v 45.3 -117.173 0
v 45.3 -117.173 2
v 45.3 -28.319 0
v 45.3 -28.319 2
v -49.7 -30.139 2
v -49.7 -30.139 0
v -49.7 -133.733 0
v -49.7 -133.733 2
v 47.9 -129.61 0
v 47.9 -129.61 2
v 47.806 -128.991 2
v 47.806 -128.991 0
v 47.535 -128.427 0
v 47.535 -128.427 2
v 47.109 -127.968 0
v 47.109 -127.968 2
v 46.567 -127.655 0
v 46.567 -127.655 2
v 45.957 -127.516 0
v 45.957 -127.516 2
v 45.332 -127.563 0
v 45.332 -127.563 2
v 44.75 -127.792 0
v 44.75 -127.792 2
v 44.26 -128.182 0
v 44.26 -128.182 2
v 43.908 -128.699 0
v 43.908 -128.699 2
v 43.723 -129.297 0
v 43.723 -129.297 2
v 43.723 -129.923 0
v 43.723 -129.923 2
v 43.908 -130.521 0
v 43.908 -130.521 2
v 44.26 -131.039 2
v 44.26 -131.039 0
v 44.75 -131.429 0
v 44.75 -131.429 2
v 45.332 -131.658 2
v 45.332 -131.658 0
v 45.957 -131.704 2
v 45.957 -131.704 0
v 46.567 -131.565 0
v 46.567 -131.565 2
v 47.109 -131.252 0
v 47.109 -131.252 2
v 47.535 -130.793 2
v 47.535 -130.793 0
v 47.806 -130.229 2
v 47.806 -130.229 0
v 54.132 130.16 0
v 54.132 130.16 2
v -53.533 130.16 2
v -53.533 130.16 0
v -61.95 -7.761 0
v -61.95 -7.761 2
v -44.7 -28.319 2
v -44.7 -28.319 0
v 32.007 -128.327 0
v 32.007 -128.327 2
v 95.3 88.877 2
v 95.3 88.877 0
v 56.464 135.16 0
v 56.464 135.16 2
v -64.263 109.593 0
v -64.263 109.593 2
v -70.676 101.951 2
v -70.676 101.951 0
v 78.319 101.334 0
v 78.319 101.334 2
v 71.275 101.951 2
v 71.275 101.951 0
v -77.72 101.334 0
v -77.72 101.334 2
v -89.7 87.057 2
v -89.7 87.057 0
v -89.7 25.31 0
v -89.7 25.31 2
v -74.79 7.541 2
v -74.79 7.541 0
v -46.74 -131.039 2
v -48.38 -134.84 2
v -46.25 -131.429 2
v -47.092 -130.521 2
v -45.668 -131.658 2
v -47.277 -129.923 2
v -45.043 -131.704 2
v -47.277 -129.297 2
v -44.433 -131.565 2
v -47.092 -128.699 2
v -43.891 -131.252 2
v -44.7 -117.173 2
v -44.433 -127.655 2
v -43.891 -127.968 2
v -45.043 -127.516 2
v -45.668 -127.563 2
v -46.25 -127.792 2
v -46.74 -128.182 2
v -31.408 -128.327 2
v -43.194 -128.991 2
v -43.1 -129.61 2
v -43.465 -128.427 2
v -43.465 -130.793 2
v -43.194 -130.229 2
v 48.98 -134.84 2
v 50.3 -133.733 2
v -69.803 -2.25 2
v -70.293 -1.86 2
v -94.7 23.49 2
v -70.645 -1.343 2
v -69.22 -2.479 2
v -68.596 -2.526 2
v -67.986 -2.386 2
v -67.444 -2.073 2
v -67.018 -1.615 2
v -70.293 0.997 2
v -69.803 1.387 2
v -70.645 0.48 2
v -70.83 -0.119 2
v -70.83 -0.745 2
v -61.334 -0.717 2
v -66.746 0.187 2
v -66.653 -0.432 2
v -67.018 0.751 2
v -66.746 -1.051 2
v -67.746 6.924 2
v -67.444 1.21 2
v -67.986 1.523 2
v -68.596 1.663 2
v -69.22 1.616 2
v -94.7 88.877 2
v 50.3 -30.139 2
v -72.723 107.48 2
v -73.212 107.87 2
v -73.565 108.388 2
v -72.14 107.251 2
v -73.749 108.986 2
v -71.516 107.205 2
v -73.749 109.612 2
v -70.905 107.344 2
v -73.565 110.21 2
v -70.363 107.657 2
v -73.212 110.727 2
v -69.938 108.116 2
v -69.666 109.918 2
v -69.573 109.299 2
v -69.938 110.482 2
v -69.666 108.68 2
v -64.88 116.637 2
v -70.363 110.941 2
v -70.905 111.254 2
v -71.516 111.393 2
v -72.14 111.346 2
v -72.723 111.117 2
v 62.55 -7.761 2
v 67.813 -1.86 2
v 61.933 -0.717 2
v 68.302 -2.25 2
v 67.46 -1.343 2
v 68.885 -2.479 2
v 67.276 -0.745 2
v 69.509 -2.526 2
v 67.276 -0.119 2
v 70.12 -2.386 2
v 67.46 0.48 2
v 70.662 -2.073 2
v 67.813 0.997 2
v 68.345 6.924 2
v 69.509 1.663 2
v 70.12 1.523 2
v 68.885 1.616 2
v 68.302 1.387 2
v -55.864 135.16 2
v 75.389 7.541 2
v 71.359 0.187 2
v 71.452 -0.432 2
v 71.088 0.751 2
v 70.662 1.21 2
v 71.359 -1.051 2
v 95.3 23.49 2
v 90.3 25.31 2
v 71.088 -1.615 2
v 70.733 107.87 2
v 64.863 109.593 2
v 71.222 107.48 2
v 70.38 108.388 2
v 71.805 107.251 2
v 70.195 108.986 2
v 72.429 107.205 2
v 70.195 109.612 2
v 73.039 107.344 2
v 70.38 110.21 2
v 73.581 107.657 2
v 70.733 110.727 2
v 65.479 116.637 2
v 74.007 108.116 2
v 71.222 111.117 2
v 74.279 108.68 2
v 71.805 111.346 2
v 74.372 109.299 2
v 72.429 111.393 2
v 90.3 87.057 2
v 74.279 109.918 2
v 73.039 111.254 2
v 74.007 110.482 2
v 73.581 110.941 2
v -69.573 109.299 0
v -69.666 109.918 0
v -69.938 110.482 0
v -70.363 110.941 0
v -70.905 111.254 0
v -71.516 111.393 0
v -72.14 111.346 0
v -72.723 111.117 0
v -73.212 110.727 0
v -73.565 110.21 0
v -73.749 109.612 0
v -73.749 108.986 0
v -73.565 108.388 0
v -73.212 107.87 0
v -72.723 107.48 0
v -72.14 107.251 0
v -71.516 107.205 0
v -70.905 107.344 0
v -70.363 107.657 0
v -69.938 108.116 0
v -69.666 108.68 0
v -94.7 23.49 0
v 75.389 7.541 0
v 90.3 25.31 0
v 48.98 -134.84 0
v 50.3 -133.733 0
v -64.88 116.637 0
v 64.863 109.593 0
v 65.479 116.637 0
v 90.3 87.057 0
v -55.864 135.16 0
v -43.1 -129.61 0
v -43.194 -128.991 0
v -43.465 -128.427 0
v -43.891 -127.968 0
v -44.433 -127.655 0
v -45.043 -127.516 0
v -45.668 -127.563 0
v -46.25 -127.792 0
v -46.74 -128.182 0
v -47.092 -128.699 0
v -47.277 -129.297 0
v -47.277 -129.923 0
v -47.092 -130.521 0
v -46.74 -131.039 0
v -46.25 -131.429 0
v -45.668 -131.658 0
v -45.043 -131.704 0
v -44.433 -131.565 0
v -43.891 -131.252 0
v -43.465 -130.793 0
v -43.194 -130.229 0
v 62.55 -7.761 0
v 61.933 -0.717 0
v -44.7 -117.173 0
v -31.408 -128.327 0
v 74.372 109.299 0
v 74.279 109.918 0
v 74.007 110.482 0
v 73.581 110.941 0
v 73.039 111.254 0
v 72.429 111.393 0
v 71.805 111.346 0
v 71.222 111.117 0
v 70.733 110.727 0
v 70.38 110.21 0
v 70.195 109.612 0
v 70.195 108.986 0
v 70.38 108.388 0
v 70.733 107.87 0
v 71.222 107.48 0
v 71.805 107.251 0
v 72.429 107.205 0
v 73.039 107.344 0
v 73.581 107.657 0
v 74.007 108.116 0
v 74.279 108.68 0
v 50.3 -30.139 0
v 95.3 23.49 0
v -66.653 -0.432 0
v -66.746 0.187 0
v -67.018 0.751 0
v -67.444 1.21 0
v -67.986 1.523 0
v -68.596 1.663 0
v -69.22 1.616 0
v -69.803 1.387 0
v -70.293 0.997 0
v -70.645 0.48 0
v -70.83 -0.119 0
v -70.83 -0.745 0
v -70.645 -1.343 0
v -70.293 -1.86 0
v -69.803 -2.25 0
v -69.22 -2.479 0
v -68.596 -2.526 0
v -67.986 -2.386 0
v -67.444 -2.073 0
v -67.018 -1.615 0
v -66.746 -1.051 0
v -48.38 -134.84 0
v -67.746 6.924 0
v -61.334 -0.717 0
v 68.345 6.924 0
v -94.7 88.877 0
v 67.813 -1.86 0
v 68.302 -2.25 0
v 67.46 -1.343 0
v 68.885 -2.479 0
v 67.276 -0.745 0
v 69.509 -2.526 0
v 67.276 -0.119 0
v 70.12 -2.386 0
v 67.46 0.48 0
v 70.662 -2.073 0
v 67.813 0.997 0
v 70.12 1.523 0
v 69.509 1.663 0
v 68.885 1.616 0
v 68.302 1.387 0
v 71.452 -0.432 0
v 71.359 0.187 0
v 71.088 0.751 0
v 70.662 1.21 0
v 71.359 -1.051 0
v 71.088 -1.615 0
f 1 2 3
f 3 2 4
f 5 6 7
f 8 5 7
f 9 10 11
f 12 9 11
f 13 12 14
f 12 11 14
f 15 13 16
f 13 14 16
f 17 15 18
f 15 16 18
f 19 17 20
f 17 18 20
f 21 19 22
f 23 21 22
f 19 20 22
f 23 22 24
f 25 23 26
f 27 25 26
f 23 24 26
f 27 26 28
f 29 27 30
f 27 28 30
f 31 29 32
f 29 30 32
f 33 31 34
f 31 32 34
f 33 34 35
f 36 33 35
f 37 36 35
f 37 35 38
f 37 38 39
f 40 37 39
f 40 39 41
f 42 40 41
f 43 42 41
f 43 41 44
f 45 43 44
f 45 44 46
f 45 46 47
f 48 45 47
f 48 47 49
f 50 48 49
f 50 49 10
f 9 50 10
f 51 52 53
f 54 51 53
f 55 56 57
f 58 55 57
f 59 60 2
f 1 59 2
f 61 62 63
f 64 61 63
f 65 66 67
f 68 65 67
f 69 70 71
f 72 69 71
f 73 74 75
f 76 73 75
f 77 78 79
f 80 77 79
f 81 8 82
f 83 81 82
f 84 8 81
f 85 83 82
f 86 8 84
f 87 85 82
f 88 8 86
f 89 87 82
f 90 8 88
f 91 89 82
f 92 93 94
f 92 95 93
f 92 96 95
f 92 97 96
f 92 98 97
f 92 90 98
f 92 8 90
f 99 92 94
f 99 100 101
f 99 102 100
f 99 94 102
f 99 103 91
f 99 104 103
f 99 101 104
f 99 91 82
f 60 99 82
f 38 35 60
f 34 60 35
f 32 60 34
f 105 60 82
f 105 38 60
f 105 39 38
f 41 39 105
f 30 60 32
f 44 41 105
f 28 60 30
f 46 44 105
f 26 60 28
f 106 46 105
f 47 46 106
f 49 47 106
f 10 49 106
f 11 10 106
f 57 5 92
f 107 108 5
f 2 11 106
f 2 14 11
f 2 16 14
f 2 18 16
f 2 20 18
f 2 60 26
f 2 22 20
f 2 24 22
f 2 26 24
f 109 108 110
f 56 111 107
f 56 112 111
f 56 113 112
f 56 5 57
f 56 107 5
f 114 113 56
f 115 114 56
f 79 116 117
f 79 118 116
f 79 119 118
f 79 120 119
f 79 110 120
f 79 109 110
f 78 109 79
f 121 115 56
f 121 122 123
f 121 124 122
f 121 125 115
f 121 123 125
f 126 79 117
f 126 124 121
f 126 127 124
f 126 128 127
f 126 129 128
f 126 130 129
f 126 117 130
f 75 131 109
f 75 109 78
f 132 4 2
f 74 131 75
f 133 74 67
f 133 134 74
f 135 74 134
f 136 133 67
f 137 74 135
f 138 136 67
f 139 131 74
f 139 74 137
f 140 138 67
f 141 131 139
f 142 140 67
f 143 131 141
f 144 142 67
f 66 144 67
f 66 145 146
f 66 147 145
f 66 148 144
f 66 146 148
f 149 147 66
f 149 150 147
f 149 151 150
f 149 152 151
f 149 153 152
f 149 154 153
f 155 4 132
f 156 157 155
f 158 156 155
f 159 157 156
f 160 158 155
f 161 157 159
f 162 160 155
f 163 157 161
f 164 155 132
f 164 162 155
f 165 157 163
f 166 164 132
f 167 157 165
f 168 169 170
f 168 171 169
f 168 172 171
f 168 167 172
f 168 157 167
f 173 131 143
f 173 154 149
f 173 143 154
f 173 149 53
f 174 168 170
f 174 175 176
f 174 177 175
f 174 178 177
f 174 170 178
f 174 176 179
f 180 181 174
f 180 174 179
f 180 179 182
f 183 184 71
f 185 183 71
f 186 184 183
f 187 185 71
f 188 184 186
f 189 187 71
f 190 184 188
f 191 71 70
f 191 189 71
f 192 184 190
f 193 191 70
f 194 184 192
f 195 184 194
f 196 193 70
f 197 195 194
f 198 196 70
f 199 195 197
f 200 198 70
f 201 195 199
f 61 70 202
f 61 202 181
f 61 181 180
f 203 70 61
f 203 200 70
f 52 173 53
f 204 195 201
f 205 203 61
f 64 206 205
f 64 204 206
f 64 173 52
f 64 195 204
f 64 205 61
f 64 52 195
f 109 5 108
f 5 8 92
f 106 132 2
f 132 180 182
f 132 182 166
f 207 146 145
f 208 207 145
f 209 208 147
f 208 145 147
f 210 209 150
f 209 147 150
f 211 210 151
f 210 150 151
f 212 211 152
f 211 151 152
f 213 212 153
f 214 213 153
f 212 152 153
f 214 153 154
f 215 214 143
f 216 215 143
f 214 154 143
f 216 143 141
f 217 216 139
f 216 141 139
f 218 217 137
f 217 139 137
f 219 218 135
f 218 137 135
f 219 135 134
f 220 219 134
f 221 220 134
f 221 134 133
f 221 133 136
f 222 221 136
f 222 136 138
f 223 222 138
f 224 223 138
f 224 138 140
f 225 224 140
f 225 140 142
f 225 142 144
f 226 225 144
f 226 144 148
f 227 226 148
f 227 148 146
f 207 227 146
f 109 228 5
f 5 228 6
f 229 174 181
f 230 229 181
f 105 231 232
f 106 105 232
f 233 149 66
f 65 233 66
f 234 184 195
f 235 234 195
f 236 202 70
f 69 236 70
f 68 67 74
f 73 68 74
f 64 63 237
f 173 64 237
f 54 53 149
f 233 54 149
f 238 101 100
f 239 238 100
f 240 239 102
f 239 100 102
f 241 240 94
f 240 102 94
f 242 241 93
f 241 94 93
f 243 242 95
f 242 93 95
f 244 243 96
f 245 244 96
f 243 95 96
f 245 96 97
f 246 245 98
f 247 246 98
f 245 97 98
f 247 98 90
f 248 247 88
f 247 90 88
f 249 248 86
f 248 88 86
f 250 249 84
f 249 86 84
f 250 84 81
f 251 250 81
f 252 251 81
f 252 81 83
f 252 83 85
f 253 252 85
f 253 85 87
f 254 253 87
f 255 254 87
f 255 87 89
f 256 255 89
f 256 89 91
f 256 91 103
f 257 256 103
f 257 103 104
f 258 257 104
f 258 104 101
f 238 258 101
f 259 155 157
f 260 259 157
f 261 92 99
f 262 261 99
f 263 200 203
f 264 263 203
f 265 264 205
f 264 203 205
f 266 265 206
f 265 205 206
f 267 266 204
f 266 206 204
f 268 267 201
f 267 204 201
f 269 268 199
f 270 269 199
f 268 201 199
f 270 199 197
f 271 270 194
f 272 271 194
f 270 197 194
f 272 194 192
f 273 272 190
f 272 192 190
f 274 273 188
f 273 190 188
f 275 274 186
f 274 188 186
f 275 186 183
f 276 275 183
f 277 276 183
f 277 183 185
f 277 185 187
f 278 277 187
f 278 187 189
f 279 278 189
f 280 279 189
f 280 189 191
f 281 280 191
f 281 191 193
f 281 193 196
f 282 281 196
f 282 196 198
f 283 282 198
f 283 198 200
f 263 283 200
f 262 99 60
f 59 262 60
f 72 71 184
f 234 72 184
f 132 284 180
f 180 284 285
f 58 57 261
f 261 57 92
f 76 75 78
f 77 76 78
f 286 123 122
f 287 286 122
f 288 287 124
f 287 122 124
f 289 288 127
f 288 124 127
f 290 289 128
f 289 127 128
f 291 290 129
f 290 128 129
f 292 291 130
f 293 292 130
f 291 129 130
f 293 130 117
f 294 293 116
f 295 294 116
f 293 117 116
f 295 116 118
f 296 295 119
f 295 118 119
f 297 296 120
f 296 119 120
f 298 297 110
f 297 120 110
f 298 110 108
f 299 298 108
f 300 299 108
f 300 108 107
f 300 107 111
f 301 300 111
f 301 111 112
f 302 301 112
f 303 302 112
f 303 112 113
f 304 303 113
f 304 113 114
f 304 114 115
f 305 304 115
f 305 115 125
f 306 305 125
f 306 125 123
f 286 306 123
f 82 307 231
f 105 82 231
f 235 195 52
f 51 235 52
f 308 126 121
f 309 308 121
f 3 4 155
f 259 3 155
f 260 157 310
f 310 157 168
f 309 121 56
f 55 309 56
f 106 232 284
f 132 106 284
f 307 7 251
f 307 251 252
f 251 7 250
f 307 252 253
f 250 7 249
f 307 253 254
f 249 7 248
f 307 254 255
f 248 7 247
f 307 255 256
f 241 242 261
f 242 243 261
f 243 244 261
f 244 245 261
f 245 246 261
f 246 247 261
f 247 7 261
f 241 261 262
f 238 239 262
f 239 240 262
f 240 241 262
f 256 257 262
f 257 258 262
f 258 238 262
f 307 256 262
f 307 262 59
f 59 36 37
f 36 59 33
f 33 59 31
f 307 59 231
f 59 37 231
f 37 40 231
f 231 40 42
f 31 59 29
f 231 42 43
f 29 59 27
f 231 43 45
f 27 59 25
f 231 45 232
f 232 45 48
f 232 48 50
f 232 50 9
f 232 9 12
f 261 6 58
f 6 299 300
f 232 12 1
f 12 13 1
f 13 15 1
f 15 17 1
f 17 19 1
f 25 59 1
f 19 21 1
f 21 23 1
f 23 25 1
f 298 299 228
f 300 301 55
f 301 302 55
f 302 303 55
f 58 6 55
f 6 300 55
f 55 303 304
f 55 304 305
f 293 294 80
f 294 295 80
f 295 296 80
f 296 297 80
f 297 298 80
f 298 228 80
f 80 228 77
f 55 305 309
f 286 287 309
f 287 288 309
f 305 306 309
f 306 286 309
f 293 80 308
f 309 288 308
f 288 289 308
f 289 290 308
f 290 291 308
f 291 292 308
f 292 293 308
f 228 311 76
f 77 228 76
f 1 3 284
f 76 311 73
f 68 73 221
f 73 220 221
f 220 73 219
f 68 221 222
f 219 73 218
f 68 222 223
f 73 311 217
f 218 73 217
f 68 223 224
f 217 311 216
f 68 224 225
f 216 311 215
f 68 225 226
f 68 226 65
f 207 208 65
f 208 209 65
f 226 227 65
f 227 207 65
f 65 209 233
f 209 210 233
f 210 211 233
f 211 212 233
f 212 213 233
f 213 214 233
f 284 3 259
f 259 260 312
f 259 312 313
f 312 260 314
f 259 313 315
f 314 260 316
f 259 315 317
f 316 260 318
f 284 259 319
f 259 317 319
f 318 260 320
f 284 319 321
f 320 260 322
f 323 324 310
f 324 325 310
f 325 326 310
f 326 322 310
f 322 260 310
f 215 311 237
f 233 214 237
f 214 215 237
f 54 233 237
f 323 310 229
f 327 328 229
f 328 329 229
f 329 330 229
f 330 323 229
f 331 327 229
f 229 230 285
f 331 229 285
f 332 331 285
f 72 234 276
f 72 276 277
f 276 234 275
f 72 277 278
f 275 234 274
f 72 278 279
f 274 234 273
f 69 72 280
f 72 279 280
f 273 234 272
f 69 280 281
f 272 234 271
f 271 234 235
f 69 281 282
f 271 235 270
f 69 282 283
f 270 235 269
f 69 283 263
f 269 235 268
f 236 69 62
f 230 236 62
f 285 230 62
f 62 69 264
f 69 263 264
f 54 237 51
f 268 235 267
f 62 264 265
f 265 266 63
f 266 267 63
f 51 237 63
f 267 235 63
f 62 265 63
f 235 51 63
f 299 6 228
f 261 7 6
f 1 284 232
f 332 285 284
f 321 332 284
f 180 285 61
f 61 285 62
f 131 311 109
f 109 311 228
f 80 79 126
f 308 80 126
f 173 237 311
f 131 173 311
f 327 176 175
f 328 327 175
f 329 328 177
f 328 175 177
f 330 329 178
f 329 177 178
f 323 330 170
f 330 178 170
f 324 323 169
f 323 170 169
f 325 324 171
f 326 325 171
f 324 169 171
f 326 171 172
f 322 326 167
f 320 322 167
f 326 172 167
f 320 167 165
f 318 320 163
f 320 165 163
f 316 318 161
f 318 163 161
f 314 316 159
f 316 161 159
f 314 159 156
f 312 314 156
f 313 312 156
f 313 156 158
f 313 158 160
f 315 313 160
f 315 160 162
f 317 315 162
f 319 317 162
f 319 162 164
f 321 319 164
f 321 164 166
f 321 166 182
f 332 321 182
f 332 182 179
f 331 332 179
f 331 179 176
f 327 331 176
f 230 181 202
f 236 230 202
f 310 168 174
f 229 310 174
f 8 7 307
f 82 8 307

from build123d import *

# Parameters (mm, degrees)
RESSALTO_EXTRUS_O1_DEPTH = 2
CORTE_EXTRUS_O1_REACH    = 4
ESBO_O2_R                = 2.1
CORTE_EXTRUS_O2_DEPTH    = 10


with BuildPart() as part:
    # Esboço1 → Ressalto-extrusão1 (new body)
    with BuildSketch(Plane.XY):
        Polygon((56.463679973, 135.159747673), (-55.864365487, 135.159747673), (-94.700342757, 88.87683224), (-94.700342757, 23.490318666), (-49.700342757, -30.138593001), (-49.700342757, -133.732537696), (-48.380219867, -134.840252327), (48.979534352, -134.840252327), (50.299657243, -133.732537696), (50.299657243, -30.138593001), (95.299657243, 23.490318666), (95.299657243, 88.87683224), align=None)
    extrude(amount=RESSALTO_EXTRUS_O1_DEPTH)

    # Esboço2 → Corte-extrusão1 (cut, up to next)
    with BuildSketch(Plane.XY.offset(2), mode=Mode.PRIVATE) as corte_extrus_o1_sk1:
        with Locations((-71.672714117, 109.298736063)):
            Circle(ESBO_O2_R)
    corte_extrus_o1_tool1 = extrude(corte_extrus_o1_sk1.sketch, amount=-CORTE_EXTRUS_O1_REACH, mode=Mode.PRIVATE) & part.part
    add(corte_extrus_o1_tool1.solids().sort_by_distance((-71.672714, 109.298736, 2))[0], mode=Mode.SUBTRACT)
    # Esboço2 → Corte-extrusão1 (cut, up to next)
    with BuildSketch(Plane.XY.offset(2), mode=Mode.PRIVATE) as corte_extrus_o1_sk2:
        with Locations((-45.200342757, -129.610252327)):
            Circle(ESBO_O2_R)
    corte_extrus_o1_tool2 = extrude(corte_extrus_o1_sk2.sketch, amount=-CORTE_EXTRUS_O1_REACH, mode=Mode.PRIVATE) & part.part
    add(corte_extrus_o1_tool2.solids().sort_by_distance((-45.200343, -129.610252, 2))[0], mode=Mode.SUBTRACT)
    # Esboço2 → Corte-extrusão1 (cut, up to next)
    with BuildSketch(Plane.XY.offset(2), mode=Mode.PRIVATE) as corte_extrus_o1_sk3:
        with Locations((45.799657243, -129.610252327)):
            Circle(ESBO_O2_R)
    corte_extrus_o1_tool3 = extrude(corte_extrus_o1_sk3.sketch, amount=-CORTE_EXTRUS_O1_REACH, mode=Mode.PRIVATE) & part.part
    add(corte_extrus_o1_tool3.solids().sort_by_distance((45.799657, -129.610252, 2))[0], mode=Mode.SUBTRACT)
    # Esboço2 → Corte-extrusão1 (cut, up to next)
    with BuildSketch(Plane.XY.offset(2), mode=Mode.PRIVATE) as corte_extrus_o1_sk4:
        with Locations((72.272028603, 109.298736063)):
            Circle(ESBO_O2_R)
    corte_extrus_o1_tool4 = extrude(corte_extrus_o1_sk4.sketch, amount=-CORTE_EXTRUS_O1_REACH, mode=Mode.PRIVATE) & part.part
    add(corte_extrus_o1_tool4.solids().sort_by_distance((72.272029, 109.298736, 2))[0], mode=Mode.SUBTRACT)
    # Esboço2 → Corte-extrusão1 (cut, up to next)
    with BuildSketch(Plane.XY.offset(2), mode=Mode.PRIVATE) as corte_extrus_o1_sk5:
        with Locations((-68.753142763, -0.431592924)):
            Circle(ESBO_O2_R)
    corte_extrus_o1_tool5 = extrude(corte_extrus_o1_sk5.sketch, amount=-CORTE_EXTRUS_O1_REACH, mode=Mode.PRIVATE) & part.part
    add(corte_extrus_o1_tool5.solids().sort_by_distance((-68.753143, -0.431593, 2))[0], mode=Mode.SUBTRACT)
    # Esboço2 → Corte-extrusão1 (cut, up to next)
    with BuildSketch(Plane.XY.offset(2), mode=Mode.PRIVATE) as corte_extrus_o1_sk6:
        with Locations((69.352457249, -0.431592924)):
            Circle(ESBO_O2_R)
    corte_extrus_o1_tool6 = extrude(corte_extrus_o1_sk6.sketch, amount=-CORTE_EXTRUS_O1_REACH, mode=Mode.PRIVATE) & part.part
    add(corte_extrus_o1_tool6.solids().sort_by_distance((69.352457, -0.431593, 2))[0], mode=Mode.SUBTRACT)

    # Esboço3 → Corte-extrusão2 (cut)
    with BuildSketch(Plane.XY.offset(2)):
        Polygon((-53.532827197, 130.159747673), (-64.879577854, 116.637216813), (-64.263293687, 109.593056549), (-70.675930858, 101.950773162), (-77.720091122, 101.334488995), (-89.700342757, 87.056981069), (-89.700342757, 25.310169837), (-74.789956765, 7.540663764), (-67.745796501, 6.924379597), (-61.334000151, -0.716901738), (-61.950284318, -7.761062002), (-44.700342757, -28.318741829), (-44.700342757, -117.173246706), (-31.407709232, -128.327090595), (32.007023717, -128.327090595), (45.299657243, -117.173246706), (45.299657243, -28.318741829), (62.549598803, -7.761062002), (61.933314636, -0.716901738), (68.345110987, 6.924379597), (75.389271251, 7.540663764), (90.299657243, 25.310169837), (90.299657243, 87.056981069), (78.319405608, 101.334488995), (71.275245343, 101.950773162), (64.862608173, 109.593056549), (65.47889234, 116.637216813), (54.132141682, 130.159747673), align=None)
    extrude(amount=-CORTE_EXTRUS_O2_DEPTH, mode=Mode.SUBTRACT)


solid = part.part
